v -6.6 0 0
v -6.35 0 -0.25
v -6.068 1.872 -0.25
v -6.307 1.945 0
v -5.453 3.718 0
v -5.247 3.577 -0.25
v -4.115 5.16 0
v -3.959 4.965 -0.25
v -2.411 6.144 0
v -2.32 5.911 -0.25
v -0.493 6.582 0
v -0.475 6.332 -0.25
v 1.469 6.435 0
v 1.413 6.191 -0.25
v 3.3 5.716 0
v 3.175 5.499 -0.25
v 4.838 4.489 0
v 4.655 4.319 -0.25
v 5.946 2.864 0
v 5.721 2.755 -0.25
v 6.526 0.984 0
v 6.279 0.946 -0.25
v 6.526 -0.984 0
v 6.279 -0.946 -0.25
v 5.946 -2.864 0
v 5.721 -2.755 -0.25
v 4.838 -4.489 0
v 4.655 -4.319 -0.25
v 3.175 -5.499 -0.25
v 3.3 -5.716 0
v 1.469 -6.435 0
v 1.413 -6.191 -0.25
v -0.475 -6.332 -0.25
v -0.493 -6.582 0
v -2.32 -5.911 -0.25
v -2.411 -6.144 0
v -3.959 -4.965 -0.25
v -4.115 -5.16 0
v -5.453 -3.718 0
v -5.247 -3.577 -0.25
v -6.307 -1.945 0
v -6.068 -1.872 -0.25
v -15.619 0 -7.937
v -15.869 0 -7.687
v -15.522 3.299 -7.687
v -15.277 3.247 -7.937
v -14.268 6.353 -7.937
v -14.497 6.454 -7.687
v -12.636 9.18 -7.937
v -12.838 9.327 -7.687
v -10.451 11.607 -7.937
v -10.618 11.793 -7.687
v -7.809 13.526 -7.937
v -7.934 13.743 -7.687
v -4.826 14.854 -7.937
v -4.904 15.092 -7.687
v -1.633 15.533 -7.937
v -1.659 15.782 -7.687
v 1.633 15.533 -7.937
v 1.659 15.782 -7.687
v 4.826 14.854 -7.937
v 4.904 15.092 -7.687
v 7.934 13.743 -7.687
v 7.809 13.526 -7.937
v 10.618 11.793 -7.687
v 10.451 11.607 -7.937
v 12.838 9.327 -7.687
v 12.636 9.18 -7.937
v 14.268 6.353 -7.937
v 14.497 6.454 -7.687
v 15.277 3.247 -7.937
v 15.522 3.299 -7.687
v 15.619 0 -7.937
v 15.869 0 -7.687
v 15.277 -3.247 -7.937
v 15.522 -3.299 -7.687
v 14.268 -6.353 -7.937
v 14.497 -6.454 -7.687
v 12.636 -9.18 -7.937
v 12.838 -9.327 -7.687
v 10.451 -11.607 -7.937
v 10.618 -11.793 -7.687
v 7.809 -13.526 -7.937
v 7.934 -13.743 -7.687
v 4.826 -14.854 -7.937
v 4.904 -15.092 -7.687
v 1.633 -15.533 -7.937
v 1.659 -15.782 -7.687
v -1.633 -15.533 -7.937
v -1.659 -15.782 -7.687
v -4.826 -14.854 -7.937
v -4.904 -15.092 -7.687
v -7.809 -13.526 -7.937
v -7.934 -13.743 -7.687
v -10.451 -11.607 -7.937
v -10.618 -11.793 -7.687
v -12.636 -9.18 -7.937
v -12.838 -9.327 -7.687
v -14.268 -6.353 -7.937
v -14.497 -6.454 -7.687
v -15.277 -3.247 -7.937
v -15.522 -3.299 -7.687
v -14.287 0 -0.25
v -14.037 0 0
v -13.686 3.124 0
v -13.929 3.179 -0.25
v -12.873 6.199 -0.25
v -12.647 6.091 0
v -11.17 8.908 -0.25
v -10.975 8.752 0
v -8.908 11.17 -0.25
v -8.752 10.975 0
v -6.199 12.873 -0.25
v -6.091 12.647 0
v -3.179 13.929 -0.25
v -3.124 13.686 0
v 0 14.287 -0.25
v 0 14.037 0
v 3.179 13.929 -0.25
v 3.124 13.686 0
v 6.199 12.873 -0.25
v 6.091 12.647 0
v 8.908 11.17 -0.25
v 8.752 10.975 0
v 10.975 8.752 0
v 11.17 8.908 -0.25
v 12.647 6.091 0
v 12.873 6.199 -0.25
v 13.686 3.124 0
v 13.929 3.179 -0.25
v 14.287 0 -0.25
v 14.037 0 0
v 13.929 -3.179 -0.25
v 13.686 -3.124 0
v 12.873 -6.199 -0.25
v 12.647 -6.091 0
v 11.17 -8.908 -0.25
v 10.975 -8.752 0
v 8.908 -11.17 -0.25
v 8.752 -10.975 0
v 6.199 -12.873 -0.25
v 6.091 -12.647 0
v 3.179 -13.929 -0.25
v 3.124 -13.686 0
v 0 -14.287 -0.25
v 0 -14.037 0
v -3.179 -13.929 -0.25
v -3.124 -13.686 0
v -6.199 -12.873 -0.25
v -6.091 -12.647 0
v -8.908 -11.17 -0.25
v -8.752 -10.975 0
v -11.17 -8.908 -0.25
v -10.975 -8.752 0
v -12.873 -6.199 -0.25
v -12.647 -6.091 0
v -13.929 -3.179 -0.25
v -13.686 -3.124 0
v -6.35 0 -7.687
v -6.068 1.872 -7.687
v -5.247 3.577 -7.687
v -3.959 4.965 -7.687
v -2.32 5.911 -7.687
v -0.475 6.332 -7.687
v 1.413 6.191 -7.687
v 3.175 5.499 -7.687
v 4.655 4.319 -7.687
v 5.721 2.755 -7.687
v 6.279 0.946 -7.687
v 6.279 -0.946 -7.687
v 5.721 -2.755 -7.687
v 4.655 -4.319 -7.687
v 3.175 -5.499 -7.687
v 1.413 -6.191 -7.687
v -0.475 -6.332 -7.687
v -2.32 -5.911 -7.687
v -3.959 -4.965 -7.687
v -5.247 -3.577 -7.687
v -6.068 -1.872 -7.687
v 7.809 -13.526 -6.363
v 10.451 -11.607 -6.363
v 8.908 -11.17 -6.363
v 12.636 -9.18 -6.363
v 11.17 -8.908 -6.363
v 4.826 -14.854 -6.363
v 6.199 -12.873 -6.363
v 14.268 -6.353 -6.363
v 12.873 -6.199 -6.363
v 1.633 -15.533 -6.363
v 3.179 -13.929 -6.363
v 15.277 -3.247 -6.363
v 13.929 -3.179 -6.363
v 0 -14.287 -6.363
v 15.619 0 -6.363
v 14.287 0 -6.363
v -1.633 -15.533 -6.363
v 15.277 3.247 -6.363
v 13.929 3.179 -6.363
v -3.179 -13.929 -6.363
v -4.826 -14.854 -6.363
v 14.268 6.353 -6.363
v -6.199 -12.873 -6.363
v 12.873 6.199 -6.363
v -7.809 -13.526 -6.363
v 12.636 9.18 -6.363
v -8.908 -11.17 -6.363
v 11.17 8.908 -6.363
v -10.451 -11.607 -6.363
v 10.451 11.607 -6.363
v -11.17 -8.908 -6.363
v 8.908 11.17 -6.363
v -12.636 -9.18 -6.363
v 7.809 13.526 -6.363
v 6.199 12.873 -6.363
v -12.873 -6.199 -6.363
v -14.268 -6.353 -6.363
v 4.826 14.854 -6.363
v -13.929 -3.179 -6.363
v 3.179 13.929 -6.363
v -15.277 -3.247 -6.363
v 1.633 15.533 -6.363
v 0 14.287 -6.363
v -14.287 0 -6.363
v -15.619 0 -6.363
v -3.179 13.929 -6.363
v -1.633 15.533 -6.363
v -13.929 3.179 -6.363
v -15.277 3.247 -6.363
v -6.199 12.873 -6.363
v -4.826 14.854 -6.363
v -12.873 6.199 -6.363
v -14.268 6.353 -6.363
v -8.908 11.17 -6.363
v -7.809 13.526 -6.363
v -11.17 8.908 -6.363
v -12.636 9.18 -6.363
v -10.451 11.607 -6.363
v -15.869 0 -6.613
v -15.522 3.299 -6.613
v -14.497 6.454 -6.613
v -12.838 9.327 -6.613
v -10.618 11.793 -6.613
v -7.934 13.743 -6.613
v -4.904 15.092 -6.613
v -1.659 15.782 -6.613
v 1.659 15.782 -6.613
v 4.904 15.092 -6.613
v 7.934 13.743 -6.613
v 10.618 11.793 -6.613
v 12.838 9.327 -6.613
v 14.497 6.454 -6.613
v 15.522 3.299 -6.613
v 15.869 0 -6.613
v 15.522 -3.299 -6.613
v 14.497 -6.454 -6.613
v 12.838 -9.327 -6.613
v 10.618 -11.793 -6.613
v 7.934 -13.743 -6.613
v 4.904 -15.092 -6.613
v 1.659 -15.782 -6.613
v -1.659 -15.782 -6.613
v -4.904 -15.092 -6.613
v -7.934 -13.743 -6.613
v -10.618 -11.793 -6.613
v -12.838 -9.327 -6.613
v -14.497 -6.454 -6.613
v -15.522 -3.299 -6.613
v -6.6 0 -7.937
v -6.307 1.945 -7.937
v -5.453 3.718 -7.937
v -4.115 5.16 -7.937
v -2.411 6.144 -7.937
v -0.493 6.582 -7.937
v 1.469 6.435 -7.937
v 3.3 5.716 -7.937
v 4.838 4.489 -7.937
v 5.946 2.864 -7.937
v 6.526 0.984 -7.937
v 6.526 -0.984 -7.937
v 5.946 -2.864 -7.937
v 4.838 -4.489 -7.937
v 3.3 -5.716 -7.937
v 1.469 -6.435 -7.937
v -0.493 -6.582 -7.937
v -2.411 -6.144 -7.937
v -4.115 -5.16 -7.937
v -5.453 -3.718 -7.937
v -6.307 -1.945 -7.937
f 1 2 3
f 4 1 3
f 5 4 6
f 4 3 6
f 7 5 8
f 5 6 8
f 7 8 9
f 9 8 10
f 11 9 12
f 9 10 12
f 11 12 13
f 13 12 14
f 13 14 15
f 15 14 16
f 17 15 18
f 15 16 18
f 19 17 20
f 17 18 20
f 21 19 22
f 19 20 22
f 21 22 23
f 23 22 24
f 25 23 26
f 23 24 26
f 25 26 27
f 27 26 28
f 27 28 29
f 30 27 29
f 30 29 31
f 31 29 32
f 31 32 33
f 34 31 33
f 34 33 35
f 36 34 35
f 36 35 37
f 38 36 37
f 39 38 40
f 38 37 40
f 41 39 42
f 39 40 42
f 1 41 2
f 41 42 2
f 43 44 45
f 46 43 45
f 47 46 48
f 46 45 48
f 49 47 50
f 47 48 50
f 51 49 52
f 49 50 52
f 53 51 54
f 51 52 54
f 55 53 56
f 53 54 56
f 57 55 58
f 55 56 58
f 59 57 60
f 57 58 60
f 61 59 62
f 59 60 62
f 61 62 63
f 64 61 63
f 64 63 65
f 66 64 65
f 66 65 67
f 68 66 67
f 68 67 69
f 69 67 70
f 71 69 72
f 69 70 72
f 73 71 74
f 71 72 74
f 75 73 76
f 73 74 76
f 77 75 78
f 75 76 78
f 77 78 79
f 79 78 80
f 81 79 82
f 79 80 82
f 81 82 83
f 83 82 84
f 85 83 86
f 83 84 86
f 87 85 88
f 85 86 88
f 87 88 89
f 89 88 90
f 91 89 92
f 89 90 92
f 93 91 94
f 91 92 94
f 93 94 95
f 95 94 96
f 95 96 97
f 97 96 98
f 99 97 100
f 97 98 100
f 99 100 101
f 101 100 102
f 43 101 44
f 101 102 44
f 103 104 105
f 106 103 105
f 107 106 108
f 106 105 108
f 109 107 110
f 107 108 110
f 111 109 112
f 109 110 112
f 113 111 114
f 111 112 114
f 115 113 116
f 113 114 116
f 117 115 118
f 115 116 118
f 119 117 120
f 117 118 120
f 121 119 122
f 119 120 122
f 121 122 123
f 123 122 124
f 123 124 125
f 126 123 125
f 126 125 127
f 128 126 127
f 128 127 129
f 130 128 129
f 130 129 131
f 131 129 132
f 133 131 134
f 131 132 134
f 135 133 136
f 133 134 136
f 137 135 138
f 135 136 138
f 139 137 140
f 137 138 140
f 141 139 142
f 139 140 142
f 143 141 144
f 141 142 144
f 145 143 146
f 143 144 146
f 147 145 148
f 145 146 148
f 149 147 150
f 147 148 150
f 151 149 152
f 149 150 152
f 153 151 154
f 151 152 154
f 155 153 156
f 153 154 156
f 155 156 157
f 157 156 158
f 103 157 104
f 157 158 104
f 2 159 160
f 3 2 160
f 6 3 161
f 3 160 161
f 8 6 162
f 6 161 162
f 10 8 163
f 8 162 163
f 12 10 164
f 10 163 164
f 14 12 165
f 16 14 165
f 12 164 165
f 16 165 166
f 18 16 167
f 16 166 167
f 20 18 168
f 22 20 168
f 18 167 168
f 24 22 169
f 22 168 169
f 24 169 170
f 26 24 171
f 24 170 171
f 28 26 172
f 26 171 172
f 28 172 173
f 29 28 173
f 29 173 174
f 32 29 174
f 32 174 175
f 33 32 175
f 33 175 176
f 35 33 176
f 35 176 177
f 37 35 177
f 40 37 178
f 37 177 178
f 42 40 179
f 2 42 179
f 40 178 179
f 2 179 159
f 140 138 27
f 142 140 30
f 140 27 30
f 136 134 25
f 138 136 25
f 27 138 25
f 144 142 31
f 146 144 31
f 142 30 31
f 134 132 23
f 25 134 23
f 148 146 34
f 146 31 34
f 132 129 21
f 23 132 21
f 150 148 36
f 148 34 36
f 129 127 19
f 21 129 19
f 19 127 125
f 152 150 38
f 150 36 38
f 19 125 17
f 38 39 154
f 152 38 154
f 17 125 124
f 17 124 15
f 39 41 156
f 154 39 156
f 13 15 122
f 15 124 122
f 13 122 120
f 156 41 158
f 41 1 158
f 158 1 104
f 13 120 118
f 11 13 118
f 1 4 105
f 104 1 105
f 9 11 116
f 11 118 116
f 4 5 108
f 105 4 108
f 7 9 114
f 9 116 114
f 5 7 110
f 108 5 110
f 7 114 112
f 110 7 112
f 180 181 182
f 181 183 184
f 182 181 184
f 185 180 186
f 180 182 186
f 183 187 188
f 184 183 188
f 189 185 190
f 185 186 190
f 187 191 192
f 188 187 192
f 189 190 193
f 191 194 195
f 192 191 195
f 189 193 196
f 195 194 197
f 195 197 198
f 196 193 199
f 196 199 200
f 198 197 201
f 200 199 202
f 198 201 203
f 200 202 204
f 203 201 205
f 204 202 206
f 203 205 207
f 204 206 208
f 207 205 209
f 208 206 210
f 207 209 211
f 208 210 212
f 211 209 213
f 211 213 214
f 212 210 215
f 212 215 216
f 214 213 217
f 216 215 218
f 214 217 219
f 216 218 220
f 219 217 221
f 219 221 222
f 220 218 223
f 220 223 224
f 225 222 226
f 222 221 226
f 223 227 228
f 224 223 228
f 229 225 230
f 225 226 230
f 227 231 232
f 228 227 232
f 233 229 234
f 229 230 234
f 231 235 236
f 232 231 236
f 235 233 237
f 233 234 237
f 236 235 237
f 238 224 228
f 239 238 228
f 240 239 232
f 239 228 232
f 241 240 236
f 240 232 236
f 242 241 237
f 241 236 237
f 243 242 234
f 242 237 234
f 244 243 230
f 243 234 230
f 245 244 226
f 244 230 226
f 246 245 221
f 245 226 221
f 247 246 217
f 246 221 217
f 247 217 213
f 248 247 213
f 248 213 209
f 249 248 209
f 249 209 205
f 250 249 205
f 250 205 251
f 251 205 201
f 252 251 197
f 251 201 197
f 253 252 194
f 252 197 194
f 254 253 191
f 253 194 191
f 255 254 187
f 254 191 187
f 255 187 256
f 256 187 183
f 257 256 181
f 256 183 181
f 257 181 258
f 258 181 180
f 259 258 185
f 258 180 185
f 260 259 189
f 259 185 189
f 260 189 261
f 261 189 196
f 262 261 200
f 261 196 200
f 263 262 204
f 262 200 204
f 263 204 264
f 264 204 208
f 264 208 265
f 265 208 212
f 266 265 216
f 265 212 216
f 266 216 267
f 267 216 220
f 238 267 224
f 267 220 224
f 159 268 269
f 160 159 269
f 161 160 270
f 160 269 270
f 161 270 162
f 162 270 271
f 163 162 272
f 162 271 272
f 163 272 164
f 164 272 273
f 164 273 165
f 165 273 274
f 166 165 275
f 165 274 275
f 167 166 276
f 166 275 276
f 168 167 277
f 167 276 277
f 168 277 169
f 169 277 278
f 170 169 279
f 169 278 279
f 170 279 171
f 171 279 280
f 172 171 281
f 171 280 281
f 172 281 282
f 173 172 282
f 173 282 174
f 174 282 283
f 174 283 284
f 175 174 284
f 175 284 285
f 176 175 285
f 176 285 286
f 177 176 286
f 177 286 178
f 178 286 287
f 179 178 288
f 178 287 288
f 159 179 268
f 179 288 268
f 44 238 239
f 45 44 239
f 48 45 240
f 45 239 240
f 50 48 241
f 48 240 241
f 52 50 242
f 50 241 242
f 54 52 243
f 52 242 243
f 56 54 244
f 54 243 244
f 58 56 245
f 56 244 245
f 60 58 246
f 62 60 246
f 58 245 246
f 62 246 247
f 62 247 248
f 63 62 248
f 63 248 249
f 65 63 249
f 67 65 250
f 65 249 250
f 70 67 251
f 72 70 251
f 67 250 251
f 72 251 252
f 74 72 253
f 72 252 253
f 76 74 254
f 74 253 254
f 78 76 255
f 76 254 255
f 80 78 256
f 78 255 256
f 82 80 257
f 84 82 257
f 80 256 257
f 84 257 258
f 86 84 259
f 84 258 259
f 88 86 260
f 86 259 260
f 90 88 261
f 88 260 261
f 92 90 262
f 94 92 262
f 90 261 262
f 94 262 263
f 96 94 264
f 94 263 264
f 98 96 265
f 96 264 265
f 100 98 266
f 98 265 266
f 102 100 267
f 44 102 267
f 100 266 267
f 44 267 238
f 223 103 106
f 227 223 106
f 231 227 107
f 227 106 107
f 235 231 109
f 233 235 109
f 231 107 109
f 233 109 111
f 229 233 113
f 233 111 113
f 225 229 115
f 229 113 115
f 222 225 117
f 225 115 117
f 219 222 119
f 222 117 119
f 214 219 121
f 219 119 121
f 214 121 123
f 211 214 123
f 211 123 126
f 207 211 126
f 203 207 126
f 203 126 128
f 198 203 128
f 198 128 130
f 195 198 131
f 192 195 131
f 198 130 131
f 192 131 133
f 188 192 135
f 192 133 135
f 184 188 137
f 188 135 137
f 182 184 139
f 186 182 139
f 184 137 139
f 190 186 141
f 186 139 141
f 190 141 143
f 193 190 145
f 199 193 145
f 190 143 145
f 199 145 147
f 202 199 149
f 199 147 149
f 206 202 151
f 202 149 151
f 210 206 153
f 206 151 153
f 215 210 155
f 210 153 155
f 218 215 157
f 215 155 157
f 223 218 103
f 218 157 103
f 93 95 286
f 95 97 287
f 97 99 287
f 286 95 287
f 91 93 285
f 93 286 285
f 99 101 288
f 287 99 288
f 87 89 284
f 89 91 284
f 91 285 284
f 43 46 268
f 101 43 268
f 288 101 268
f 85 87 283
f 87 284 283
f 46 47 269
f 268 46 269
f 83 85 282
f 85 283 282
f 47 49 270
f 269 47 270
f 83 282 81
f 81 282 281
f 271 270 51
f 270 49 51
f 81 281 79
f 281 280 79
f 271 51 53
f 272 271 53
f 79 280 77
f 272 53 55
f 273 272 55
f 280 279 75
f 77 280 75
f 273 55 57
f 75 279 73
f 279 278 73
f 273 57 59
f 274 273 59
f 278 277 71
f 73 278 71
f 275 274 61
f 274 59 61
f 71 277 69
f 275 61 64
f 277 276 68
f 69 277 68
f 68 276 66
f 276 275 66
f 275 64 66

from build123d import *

# Parameters (mm, degrees)
CHAMFER1_SIZE = 0.25


with BuildPart() as part:
    # Sketch1 → Revolve1 (revolve)
    with BuildSketch(Plane(origin=(0, 0, 0), x_dir=(1, 0, 0), z_dir=(0, 1, 0))):
        Polygon((-14.287497289, 6.362699291), (-14.287497289, 0), (-6.349997937, 0), (-6.349997937, 7.937499291), (-15.868754486, 7.937499291), (-15.868754486, 6.362699291), align=None)
    revolve(axis=Axis((0, 0, 0), (0, 0, -1)))

    # Chamfer1
    chamfer1_edges = [part.edges().sort_by_distance(p)[0] for p in [
        (14.287497289, 0, 0),
        (6.349997937, 0, 0),
        (6.349997937, 0, -7.937499291),
        (15.868754486, 0, -7.937499291),
        (15.868754486, 0, -6.362699291),
    ]]
    chamfer(chamfer1_edges, length=CHAMFER1_SIZE)


solid = part.part
